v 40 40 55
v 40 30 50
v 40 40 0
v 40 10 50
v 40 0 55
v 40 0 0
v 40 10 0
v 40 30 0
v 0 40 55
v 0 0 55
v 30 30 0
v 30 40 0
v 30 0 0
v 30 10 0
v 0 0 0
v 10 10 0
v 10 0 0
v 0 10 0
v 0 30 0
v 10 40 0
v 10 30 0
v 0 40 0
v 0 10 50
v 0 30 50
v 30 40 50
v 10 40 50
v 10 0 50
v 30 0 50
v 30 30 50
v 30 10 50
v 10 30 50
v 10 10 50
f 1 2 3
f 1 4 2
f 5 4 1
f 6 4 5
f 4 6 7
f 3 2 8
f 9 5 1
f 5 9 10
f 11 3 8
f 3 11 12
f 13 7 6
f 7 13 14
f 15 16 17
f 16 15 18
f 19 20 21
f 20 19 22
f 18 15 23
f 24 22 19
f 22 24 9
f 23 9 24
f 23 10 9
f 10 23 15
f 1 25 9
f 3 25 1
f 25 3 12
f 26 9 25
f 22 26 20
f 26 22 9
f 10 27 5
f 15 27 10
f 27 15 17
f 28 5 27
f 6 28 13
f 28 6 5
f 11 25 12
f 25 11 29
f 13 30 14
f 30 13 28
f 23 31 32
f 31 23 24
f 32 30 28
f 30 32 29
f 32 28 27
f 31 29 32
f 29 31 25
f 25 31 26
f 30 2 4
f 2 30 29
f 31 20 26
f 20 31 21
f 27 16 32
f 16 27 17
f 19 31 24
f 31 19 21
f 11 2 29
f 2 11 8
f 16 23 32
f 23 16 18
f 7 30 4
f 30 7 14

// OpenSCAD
pied_ep = 10;
pied_ht = 50;

table_lg = 40;
table_ep = 5;

difference()
{
    cube([table_lg,table_lg,pied_ht+table_ep]);
    
    translate([pied_ep,-0.01,-0.01])
    cube([table_lg-2*pied_ep,table_lg+0.02,pied_ht+0.01]);
    
    translate([-0.01,pied_ep,-0.01])
    cube([table_lg+0.02,table_lg-2*pied_ep,pied_ht+0.01]);
}
